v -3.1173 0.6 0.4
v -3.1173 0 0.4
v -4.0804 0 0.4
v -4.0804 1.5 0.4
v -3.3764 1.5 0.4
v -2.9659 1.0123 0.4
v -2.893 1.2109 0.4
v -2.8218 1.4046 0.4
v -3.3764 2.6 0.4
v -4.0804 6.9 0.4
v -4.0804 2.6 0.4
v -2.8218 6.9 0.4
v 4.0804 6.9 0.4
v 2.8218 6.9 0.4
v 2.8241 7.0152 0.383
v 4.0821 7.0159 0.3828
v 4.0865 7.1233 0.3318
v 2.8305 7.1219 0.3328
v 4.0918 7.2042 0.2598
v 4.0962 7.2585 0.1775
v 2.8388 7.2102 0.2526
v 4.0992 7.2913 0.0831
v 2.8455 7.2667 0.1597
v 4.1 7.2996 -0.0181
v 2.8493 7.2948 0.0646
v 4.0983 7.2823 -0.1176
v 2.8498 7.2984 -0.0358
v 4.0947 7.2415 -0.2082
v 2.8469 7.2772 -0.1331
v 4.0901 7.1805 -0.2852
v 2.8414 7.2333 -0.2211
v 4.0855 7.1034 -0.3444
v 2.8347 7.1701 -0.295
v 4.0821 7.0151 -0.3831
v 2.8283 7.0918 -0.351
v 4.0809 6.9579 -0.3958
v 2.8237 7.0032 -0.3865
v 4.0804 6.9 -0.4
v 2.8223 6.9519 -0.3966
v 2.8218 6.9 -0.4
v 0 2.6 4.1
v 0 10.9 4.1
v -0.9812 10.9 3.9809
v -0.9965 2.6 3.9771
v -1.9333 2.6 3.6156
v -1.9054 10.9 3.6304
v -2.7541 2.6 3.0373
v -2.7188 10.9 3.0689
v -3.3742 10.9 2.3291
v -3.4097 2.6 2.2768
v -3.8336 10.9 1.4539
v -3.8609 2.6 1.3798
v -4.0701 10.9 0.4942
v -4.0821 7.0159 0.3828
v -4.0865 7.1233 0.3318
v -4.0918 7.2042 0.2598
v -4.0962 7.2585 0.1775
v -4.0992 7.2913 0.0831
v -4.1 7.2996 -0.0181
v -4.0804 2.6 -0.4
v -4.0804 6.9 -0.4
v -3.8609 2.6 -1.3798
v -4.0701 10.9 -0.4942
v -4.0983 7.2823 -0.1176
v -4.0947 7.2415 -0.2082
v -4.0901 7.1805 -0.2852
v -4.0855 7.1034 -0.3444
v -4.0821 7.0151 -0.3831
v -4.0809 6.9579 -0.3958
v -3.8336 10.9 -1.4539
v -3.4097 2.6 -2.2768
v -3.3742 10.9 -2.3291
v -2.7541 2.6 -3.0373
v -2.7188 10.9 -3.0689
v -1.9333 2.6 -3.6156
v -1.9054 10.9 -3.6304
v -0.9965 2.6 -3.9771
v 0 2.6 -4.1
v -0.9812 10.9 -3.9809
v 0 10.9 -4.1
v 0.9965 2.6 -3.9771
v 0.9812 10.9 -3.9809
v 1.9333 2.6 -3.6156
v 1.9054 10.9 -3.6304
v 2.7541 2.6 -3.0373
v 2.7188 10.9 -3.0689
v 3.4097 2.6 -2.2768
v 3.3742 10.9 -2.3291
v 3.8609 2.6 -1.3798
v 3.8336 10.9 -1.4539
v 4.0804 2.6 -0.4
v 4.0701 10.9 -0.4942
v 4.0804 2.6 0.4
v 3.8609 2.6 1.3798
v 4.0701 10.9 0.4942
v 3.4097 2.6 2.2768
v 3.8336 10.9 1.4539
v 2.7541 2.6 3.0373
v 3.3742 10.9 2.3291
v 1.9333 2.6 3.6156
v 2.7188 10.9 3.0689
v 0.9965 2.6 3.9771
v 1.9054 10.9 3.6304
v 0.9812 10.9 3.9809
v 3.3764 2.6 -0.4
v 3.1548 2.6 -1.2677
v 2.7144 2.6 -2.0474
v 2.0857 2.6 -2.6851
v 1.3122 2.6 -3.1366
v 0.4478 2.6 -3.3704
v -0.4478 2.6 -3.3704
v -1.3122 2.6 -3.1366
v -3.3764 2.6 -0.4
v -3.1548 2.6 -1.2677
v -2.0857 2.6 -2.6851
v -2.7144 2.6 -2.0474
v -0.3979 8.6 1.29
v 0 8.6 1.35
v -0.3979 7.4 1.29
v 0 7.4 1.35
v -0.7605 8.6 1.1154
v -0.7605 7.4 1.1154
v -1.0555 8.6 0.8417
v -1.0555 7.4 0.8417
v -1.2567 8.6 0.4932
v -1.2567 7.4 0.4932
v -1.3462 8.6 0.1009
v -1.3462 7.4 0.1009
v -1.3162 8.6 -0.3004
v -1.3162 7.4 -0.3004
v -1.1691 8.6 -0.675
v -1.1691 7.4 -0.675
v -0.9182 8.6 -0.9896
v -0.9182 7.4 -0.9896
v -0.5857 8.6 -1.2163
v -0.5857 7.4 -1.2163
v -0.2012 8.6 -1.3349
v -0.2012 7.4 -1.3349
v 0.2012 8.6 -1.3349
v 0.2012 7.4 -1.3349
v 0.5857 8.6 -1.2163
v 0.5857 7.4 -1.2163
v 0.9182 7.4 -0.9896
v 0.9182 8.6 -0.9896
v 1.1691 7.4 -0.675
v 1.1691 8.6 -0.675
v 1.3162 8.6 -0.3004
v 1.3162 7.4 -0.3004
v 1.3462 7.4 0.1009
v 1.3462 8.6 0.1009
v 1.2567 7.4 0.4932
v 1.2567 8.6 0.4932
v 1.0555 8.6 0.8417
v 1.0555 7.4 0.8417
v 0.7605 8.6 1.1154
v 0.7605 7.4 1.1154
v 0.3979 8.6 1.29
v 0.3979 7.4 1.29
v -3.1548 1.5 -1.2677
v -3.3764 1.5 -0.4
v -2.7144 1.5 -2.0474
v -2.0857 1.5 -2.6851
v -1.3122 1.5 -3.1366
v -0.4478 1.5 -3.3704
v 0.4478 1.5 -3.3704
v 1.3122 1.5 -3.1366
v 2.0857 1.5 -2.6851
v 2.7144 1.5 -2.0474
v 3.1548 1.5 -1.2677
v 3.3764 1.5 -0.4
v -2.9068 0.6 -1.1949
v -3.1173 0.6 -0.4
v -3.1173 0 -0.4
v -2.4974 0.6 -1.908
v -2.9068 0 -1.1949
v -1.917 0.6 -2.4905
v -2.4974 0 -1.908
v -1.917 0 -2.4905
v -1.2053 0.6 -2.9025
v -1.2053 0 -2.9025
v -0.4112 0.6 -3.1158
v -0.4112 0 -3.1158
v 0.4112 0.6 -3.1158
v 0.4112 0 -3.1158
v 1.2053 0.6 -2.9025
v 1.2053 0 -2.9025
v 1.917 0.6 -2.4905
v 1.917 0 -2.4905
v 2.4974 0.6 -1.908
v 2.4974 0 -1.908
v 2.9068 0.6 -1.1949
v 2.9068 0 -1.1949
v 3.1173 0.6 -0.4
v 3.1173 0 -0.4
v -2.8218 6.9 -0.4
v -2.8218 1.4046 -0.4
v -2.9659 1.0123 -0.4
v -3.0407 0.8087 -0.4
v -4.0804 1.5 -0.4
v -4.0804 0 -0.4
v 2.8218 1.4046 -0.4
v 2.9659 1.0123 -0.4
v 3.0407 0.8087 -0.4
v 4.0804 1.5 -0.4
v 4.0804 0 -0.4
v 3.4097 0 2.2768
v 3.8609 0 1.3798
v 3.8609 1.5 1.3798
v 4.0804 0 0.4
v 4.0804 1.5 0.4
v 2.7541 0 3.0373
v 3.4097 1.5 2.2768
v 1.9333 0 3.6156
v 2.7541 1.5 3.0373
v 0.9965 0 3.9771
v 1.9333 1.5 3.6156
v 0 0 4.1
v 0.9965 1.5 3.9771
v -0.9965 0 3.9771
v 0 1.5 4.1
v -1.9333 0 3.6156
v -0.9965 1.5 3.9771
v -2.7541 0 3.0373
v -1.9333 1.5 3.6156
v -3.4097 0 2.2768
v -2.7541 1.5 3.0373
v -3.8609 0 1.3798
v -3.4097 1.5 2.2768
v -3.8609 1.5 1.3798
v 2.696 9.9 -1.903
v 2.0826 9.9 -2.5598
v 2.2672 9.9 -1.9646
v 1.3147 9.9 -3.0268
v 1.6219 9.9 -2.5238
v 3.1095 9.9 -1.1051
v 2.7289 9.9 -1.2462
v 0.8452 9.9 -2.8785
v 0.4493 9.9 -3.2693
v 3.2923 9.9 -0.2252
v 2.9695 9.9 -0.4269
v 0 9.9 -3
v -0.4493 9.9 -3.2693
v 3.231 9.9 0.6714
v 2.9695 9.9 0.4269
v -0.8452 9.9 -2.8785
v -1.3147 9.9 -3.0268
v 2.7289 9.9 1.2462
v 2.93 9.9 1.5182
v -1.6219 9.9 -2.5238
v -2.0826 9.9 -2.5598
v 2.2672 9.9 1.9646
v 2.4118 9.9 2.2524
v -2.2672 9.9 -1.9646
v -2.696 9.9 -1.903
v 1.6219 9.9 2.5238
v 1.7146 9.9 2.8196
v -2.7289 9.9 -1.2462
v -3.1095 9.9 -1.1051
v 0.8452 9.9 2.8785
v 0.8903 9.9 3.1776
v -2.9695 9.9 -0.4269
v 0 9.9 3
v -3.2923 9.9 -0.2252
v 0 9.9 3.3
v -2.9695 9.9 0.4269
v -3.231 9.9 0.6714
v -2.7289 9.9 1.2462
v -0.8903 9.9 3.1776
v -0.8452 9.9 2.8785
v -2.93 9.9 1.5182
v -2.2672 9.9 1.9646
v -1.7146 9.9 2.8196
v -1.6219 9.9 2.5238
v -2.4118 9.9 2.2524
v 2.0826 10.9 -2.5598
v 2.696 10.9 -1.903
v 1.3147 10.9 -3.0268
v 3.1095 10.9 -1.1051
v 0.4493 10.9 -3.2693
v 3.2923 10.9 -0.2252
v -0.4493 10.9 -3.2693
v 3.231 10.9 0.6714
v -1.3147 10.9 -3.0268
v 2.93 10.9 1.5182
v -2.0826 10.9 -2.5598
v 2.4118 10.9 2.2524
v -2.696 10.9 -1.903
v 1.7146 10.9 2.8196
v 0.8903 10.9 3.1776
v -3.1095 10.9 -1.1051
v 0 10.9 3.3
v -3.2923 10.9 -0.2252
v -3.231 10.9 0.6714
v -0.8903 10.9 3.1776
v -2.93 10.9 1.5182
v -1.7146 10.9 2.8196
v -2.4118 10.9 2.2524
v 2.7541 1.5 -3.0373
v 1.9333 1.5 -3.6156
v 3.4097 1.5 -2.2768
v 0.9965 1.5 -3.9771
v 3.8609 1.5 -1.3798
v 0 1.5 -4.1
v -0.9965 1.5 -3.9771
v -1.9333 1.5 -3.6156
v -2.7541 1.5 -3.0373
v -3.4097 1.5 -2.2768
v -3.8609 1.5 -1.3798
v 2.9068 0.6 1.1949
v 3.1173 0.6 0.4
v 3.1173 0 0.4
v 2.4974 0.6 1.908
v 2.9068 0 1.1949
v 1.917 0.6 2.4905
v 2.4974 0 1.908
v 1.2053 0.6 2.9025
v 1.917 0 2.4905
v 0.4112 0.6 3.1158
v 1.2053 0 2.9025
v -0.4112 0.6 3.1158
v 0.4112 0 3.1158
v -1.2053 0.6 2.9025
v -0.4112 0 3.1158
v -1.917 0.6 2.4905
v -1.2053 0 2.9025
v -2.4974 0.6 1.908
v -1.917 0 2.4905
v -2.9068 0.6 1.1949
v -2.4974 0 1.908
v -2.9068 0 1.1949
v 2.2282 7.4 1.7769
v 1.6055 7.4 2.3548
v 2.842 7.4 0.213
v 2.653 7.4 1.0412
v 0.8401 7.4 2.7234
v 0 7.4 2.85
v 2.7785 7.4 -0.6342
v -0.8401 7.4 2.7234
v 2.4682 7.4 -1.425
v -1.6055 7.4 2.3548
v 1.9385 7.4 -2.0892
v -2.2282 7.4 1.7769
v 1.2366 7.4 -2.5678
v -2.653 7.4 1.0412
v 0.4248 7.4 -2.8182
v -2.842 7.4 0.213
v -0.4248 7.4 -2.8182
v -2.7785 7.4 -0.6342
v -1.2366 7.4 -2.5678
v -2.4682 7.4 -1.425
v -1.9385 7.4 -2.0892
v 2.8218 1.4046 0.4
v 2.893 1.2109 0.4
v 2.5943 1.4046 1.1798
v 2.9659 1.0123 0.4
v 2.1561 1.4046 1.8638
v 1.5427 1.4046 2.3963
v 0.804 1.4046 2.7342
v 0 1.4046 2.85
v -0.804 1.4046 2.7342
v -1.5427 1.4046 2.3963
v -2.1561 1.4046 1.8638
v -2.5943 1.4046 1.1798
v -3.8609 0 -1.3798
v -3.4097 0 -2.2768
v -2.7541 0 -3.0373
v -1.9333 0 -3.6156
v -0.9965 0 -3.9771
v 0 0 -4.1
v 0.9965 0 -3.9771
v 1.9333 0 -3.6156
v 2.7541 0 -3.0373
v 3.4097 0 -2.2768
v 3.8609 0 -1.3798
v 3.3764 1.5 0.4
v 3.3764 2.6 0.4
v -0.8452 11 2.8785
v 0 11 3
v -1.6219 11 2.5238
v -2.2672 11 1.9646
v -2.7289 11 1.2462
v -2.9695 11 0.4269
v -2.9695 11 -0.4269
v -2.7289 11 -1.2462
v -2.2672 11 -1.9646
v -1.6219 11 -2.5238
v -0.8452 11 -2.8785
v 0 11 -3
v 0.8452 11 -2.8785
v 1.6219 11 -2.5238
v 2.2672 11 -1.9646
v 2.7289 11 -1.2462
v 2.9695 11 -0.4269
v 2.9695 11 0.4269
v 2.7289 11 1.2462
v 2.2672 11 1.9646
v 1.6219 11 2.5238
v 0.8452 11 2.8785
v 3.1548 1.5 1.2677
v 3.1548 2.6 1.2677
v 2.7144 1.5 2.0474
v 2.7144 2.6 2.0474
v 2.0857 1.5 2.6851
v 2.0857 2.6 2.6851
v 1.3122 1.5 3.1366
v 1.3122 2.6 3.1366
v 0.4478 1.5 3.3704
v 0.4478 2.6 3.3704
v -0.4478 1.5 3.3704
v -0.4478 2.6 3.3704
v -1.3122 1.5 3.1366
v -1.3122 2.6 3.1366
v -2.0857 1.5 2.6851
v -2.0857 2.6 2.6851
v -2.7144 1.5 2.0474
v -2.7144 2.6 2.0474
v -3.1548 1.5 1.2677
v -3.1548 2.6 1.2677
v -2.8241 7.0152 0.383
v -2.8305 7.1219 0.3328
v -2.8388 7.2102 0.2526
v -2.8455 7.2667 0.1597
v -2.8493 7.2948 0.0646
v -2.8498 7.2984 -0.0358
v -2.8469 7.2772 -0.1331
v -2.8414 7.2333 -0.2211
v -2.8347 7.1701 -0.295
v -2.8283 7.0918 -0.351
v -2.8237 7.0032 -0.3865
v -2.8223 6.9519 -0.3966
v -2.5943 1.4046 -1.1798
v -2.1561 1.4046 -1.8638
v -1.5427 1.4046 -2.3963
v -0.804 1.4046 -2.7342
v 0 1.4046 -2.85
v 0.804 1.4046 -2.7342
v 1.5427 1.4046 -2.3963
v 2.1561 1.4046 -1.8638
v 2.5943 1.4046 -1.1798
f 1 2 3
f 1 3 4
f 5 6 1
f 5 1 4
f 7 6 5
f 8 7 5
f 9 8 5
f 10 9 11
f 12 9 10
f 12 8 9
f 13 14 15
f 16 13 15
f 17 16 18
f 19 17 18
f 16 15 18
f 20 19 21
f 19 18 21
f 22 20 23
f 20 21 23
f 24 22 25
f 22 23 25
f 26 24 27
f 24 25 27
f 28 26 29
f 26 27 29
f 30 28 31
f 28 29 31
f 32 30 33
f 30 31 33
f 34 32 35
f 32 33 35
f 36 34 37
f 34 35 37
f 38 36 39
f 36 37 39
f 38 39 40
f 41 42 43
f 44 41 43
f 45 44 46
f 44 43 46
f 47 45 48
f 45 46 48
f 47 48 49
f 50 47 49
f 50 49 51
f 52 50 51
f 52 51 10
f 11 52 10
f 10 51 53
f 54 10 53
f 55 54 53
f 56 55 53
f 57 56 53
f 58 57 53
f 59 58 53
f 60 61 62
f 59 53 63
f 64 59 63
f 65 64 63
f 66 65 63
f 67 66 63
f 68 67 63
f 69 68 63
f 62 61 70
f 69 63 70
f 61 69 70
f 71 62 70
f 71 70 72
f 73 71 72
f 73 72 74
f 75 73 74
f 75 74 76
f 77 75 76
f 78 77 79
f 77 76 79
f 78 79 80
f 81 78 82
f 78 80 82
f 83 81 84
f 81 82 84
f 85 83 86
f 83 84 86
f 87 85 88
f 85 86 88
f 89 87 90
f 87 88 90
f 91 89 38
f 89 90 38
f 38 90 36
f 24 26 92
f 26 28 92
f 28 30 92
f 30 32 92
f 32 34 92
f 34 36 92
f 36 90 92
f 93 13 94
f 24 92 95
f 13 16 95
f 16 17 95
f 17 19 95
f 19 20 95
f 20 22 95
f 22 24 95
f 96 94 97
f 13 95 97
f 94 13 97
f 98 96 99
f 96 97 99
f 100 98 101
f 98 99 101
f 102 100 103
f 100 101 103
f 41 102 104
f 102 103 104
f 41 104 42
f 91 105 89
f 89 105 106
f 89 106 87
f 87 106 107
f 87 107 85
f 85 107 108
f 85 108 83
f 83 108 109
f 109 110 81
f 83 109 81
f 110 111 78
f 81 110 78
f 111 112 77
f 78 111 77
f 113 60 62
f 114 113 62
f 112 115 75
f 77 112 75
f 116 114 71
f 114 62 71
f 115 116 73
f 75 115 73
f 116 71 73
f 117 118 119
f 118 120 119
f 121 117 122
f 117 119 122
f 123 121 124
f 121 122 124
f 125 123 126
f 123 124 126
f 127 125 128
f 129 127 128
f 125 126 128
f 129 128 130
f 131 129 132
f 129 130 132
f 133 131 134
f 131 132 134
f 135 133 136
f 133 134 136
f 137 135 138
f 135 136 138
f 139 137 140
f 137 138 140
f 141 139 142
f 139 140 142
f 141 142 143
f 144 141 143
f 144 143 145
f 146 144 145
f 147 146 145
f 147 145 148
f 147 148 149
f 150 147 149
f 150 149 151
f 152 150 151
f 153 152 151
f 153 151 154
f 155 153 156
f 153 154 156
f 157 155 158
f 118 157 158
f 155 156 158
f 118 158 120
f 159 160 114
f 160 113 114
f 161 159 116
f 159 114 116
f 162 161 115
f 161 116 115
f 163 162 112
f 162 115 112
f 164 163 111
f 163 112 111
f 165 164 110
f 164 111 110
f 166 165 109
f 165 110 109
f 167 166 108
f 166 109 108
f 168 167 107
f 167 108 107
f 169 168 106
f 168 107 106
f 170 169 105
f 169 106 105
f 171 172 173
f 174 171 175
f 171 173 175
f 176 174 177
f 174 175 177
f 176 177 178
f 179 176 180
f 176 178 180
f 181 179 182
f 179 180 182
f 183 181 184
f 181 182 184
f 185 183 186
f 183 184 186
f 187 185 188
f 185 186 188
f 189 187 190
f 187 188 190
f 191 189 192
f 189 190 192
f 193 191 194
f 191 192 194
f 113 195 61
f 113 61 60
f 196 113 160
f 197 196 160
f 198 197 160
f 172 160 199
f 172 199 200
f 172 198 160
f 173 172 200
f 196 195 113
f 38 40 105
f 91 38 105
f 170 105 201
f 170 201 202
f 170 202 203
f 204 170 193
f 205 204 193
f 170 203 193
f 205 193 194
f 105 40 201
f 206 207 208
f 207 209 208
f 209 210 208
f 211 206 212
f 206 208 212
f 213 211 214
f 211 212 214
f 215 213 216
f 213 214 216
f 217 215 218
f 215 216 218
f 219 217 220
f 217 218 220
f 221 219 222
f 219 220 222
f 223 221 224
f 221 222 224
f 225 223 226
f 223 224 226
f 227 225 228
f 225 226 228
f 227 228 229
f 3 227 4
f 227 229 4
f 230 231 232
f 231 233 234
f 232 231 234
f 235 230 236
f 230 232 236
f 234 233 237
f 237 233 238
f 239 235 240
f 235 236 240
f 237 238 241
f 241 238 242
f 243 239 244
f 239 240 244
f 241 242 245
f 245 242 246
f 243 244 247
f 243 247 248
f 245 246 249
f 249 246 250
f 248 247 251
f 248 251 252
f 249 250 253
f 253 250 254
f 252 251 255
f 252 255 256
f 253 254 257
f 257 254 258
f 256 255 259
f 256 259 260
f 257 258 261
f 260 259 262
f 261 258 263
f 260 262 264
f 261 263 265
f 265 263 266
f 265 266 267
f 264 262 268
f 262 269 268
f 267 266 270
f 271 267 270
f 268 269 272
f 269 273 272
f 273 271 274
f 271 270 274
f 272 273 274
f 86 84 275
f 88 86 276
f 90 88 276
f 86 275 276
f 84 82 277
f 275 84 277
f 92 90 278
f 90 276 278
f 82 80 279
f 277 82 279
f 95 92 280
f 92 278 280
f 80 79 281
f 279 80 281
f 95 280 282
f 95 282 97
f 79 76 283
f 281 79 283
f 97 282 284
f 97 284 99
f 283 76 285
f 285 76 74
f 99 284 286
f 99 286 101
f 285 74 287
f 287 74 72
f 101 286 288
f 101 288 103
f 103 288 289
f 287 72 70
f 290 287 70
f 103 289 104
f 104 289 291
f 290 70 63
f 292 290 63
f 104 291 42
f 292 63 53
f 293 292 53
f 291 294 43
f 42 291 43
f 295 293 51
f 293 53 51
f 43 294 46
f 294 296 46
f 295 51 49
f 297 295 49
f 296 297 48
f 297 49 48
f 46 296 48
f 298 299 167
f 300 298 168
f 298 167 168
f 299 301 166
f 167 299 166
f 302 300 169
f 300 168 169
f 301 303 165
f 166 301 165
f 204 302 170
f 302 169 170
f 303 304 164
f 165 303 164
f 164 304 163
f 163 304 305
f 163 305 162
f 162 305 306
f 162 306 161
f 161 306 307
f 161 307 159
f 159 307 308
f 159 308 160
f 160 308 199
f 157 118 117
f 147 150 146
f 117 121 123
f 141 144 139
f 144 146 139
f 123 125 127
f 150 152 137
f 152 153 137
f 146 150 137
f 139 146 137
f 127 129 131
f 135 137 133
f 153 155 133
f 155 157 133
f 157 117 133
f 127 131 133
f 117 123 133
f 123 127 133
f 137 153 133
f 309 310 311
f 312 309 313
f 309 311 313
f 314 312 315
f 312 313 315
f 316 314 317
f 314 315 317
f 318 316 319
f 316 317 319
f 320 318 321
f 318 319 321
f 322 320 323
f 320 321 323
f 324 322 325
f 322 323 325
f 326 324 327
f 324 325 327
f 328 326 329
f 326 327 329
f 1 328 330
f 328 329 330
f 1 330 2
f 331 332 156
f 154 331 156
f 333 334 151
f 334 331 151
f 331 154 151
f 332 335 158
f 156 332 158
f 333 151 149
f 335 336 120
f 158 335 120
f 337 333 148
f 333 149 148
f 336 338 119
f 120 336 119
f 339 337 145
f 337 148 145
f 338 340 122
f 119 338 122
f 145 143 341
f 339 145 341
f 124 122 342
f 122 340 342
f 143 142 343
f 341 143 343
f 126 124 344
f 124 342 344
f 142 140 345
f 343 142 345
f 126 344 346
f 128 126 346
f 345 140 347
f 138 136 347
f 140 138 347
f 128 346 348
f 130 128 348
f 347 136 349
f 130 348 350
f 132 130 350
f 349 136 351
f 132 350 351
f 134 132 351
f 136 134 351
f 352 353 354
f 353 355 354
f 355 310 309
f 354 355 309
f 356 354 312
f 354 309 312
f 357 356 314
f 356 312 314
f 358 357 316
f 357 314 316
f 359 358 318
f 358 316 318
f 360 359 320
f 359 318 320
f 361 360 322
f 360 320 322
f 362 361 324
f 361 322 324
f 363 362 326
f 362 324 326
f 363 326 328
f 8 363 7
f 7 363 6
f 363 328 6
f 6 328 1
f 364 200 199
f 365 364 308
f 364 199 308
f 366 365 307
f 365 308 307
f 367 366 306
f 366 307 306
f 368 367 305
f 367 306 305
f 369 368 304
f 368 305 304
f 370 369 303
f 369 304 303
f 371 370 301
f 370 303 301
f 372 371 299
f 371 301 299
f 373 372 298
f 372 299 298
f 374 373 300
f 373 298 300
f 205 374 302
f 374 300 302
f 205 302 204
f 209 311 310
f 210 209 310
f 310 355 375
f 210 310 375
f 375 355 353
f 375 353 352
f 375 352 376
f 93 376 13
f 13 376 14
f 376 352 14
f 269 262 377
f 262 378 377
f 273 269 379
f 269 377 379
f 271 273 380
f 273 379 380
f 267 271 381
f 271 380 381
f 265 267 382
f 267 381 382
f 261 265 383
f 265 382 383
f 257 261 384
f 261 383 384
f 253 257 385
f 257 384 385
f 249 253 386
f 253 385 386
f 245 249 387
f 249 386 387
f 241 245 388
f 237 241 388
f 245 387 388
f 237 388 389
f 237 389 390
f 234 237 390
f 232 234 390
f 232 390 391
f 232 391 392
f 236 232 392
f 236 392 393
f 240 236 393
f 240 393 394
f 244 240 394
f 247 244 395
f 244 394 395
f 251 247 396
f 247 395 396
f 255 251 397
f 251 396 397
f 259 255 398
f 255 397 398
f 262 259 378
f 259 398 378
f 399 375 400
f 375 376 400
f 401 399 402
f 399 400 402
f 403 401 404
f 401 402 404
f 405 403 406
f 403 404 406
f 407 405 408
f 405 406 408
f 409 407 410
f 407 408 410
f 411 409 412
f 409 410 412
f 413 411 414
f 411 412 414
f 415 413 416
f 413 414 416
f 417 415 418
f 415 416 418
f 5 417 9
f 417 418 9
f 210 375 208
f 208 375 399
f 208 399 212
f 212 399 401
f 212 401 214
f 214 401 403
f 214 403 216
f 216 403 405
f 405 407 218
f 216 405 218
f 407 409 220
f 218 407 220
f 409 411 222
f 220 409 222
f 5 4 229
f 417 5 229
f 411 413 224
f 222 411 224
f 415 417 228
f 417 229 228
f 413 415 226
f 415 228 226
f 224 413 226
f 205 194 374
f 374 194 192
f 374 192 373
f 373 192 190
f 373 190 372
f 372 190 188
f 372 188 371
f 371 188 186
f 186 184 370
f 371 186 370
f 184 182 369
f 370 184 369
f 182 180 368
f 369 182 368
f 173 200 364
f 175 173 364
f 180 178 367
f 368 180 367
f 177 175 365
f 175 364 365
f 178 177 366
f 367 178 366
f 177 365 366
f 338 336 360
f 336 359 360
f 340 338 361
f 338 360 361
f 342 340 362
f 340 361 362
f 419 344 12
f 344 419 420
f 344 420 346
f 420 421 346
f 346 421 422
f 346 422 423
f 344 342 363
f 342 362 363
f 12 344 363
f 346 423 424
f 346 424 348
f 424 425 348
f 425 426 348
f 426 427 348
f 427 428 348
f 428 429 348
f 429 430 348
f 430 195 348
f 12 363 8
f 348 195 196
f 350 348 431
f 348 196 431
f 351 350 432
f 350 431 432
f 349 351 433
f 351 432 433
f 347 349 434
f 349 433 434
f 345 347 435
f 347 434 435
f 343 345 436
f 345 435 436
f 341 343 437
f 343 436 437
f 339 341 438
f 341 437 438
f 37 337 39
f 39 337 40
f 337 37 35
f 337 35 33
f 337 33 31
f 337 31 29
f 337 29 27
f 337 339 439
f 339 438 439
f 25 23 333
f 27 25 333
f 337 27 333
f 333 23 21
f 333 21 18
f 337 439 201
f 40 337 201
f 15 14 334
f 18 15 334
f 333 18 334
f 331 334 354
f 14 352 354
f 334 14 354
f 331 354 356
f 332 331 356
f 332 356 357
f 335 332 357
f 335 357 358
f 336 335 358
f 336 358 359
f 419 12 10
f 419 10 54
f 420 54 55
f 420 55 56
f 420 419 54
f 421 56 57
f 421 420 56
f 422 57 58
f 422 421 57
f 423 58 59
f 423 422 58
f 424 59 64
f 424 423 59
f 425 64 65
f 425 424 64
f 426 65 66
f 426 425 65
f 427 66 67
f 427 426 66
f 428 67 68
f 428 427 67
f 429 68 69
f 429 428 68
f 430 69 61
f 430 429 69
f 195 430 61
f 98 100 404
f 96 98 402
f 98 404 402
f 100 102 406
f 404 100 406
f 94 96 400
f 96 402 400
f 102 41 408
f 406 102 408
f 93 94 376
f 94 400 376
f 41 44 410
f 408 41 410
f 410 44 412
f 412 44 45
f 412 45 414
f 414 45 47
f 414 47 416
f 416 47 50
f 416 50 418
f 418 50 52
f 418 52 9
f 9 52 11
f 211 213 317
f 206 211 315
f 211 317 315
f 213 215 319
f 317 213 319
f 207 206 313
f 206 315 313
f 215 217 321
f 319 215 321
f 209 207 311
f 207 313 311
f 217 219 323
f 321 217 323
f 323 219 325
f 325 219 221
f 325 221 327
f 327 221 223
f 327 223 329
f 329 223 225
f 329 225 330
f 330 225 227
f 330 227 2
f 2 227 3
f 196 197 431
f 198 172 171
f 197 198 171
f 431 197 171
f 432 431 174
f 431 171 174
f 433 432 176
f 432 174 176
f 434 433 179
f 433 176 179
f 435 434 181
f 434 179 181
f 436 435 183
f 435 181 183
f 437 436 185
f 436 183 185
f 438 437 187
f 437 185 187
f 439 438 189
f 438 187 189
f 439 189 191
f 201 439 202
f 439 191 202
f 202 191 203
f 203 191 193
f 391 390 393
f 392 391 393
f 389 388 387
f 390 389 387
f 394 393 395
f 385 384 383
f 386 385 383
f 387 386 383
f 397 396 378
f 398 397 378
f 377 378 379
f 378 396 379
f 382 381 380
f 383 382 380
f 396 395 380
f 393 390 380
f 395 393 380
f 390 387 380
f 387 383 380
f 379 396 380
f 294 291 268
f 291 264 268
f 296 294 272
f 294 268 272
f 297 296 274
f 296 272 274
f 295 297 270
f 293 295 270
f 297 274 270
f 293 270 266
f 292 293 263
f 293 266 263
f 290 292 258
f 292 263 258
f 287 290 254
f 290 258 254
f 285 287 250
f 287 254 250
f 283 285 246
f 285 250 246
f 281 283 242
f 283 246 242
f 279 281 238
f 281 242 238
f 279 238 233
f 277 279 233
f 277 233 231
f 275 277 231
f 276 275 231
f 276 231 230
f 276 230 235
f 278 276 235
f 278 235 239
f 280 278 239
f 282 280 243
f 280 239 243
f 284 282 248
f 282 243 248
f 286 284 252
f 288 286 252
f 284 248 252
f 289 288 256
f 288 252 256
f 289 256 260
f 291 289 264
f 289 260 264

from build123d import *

# Parameters (mm, degrees)
WYTNIJ_WYCI_GNI_CIE1_DEPTH      = 5.1
WYTNIJ_WYCI_GNI_CIE1_DEPTH_BACK = 5.1


with BuildPart() as part:
    # Szkic2 → Obrót1 (revolve)
    with BuildSketch(Plane(origin=(0, 0, 0), x_dir=(0, 0, -1), z_dir=(1, 0, 0))):
        Polygon((-3.3, 10.9), (-3.3, 9.9), (-3, 9.9), (-3, 11), (0, 11), (0, 8.6), (-1.35, 8.6), (-1.35, 7.4), (-2.85, 7.4), (-2.85, 1.404592906), (-3.142847868, 0.6), (-3.142847868, 0), (-4.1, 0), (-4.1, 1.5), (-3.4, 1.5), (-3.4, 2.6), (-4.1, 2.6), (-4.1, 10.9), align=None)
    revolve(axis=Axis((0, 0, 0), (0, -1, 0)))

    # Szkic3 → Wytnij-wyciągnięcie1 (cut, two sides)
    with BuildSketch(Plane(origin=(0, 0, 0), x_dir=(0, 0, -1), z_dir=(1, 0, 0))) as wytnij_wyci_gni_cie1_sk:
        with BuildLine():
            Line((-0.4, 0), (-0.4, 6.9))
            ThreePointArc((-0.4, 6.9), (0, 7.3), (0.4, 6.9))
            Line((0.4, 6.9), (0.4, 0))
            Line((0.4, 0), (-0.4, 0))
        make_face()
    extrude(amount=WYTNIJ_WYCI_GNI_CIE1_DEPTH, mode=Mode.SUBTRACT)
    extrude(wytnij_wyci_gni_cie1_sk.sketch, amount=-WYTNIJ_WYCI_GNI_CIE1_DEPTH_BACK, mode=Mode.SUBTRACT)


solid = part.part
